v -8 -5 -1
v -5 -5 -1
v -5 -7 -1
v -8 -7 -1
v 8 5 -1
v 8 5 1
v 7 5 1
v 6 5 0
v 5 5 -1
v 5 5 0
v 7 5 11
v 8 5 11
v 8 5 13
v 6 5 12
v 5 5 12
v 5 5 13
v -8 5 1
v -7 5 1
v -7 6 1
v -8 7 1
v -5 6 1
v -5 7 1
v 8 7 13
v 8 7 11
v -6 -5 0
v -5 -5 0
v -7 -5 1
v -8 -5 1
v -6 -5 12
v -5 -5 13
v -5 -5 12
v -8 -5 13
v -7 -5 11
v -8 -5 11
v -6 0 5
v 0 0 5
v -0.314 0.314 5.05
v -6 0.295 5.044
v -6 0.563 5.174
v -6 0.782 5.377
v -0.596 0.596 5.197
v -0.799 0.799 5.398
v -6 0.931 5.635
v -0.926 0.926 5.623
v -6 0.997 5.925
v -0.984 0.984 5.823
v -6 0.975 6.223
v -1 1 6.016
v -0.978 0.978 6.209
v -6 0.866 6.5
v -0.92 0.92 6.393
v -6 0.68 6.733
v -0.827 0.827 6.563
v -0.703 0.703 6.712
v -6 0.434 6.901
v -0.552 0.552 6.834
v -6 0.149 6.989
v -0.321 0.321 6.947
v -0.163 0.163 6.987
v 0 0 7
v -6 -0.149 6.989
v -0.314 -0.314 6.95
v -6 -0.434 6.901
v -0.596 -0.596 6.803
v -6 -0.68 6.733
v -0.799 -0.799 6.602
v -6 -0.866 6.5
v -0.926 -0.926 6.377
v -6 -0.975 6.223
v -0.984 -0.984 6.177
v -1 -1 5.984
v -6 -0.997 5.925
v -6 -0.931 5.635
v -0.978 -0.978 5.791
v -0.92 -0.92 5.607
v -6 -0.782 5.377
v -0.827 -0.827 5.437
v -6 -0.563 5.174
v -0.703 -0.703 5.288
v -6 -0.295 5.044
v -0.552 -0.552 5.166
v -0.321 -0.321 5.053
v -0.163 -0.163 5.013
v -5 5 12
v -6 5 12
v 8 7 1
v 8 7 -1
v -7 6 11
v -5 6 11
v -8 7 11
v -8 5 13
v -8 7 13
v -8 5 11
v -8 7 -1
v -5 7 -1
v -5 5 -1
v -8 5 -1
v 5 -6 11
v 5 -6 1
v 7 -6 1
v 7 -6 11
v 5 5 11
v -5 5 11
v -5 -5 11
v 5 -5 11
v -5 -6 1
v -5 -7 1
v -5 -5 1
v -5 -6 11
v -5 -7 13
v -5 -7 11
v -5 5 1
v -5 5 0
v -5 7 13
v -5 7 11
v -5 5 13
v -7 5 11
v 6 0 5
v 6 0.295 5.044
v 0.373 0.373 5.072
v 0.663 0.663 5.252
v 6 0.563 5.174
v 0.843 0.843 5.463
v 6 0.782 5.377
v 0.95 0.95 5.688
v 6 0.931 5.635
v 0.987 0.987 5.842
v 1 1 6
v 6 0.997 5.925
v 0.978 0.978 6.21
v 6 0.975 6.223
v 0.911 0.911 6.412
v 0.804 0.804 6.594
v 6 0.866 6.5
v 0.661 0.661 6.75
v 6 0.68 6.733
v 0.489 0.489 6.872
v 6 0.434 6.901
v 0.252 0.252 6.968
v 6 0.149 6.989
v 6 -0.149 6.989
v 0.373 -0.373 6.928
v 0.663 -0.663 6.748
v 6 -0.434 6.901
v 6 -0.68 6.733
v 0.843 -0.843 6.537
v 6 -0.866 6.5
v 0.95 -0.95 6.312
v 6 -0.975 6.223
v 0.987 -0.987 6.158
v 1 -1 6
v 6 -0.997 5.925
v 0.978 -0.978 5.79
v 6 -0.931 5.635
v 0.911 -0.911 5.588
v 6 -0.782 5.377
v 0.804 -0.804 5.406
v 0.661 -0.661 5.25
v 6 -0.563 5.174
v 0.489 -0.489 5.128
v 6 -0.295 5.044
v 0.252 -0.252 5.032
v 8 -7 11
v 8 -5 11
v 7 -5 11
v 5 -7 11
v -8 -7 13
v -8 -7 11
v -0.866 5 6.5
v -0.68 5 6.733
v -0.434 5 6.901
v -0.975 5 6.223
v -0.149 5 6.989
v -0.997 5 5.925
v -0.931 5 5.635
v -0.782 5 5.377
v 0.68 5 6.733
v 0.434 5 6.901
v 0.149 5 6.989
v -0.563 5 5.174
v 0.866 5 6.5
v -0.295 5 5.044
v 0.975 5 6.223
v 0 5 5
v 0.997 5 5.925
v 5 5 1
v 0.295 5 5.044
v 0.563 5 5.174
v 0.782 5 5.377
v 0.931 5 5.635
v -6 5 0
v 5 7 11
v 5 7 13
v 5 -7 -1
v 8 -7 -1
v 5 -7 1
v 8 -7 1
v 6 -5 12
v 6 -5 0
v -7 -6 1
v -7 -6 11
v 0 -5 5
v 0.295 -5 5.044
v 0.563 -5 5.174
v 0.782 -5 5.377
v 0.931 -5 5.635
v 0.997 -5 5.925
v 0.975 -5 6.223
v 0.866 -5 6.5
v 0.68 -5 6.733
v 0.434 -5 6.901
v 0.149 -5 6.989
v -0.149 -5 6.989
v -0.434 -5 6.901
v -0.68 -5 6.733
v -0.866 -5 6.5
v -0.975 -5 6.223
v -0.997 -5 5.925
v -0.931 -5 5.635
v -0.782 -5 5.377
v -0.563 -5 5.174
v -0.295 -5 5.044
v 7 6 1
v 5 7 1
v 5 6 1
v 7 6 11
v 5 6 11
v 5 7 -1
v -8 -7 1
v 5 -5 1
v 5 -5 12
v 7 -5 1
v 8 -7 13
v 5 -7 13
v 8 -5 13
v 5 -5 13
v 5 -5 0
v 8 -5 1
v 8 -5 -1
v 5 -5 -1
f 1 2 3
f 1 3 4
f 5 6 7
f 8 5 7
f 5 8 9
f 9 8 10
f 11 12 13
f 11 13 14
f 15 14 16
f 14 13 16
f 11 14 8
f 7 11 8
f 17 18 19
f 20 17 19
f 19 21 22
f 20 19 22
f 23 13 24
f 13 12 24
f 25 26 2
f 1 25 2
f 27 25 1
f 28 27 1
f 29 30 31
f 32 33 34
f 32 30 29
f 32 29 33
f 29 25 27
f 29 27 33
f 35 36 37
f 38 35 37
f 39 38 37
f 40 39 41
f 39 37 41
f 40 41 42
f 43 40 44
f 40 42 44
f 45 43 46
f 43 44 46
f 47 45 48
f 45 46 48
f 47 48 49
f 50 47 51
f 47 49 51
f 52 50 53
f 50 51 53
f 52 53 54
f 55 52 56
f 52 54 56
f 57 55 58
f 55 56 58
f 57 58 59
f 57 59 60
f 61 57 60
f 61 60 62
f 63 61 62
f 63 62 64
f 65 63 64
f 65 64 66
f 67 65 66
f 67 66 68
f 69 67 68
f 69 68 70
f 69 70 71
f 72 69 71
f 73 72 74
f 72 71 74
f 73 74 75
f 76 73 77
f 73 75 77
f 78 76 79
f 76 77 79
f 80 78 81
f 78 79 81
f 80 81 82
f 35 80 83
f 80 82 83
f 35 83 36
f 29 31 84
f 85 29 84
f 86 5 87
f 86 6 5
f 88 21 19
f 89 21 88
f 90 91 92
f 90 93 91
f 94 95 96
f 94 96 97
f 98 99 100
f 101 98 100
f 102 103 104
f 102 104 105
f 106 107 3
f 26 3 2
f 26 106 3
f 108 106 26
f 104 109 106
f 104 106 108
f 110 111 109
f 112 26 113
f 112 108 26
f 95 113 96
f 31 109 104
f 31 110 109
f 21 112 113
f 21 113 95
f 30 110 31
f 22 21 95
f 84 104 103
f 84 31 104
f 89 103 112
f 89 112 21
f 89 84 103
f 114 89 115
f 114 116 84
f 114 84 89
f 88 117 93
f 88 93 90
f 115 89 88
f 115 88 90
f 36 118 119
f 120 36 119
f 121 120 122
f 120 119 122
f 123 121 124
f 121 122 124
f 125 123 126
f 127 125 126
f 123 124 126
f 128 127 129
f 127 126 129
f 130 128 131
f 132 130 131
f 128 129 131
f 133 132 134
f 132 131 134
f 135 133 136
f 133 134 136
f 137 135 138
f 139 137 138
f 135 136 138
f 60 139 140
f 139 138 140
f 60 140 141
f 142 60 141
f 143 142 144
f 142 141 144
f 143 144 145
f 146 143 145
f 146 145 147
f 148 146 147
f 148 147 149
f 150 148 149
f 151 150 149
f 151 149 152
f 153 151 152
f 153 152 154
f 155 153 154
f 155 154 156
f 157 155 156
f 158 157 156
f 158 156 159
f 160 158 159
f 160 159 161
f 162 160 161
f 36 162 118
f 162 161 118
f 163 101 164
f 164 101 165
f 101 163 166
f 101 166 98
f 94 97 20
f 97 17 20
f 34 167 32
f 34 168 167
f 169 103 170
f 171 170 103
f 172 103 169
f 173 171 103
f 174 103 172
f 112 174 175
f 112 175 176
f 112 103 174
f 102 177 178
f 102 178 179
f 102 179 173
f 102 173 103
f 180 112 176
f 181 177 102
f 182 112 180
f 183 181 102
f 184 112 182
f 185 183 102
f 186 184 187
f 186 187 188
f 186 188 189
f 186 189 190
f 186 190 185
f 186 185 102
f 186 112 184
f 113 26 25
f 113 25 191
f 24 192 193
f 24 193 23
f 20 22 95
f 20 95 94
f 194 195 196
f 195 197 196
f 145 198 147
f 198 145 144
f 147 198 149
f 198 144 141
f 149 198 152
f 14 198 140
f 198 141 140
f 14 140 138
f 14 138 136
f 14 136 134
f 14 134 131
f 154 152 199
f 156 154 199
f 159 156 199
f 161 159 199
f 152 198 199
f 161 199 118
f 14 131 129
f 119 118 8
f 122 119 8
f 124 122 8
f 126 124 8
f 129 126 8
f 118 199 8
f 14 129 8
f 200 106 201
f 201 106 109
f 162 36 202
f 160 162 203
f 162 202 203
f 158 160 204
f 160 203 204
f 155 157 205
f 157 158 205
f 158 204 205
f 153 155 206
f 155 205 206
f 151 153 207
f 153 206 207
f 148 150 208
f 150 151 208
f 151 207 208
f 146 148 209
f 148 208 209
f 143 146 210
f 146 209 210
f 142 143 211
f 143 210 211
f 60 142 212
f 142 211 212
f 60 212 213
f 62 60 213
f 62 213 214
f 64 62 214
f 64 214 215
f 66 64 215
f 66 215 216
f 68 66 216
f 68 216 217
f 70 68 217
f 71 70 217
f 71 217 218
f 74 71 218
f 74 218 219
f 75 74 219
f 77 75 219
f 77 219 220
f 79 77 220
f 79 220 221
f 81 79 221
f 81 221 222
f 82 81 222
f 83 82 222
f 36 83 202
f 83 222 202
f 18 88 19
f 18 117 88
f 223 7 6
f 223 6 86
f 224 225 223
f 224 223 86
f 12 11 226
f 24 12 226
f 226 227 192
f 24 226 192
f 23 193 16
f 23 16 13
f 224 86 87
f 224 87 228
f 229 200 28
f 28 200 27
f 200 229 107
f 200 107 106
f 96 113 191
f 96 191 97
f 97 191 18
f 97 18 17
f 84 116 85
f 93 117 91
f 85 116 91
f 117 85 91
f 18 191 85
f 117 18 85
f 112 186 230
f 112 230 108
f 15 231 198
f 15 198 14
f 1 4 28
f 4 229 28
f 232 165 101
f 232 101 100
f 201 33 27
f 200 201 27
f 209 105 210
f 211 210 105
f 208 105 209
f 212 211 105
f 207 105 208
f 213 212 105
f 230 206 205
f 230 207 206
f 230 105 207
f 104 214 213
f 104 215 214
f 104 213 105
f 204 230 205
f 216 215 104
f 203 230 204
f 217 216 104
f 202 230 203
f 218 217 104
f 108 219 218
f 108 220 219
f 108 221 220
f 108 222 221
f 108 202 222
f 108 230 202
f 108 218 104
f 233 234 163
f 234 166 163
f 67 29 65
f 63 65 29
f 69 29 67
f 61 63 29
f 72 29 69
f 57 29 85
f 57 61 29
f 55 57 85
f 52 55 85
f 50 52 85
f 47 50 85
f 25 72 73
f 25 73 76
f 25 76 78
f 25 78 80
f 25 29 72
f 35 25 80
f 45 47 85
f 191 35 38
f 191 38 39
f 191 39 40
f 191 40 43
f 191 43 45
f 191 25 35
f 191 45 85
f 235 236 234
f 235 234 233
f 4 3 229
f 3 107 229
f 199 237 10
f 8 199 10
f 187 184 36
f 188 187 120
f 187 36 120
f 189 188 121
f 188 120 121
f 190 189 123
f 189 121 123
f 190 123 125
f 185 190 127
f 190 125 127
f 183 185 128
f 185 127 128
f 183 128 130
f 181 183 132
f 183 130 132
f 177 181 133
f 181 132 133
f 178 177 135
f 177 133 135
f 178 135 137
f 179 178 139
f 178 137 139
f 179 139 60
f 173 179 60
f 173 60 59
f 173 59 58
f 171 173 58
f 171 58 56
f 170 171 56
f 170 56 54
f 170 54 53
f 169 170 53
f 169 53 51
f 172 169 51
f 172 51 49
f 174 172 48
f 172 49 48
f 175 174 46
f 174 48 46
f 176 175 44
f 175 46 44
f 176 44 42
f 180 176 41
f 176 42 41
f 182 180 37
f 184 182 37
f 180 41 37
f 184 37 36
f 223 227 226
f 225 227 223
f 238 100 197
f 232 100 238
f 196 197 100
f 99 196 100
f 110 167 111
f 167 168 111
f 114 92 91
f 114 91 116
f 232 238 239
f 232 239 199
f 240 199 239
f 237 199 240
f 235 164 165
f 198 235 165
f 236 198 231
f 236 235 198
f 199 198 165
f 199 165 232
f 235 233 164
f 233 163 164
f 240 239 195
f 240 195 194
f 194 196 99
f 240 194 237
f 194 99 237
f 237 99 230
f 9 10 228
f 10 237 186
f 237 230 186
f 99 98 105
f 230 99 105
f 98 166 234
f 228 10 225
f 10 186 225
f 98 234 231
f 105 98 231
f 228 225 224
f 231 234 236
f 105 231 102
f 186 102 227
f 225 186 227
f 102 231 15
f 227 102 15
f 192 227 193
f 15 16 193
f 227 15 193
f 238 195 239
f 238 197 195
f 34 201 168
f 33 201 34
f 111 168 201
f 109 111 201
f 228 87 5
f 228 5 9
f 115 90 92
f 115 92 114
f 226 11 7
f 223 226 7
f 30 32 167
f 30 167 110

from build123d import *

# Parameters (mm, degrees)
SKETCH1_W            = 12
SKETCH1_H            = 12
BOSS_EXTRUDE1_DEPTH  = 12
SKETCH2_W            = 10
SKETCH2_H            = 12
CUT_EXTRUDE1_DEPTH   = 1
SKETCH3_W            = 10
SKETCH3_H            = 11
CUT_EXTRUDE2_DEPTH   = 1
SKETCH4_W            = 10
SKETCH4_H            = 11
CUT_EXTRUDE3_DEPTH   = 1
SKETCH5_W            = 10
SKETCH5_H            = 10
CUT_EXTRUDE4_DEPTH   = 1
SKETCH6_W            = 12
SKETCH6_H            = 1
BOSS_EXTRUDE2_DEPTH  = 1
SKETCH7_W            = 12
SKETCH7_H            = 1
BOSS_EXTRUDE3_DEPTH  = 1
SKETCH8_W            = 12
SKETCH8_H            = 1
BOSS_EXTRUDE4_DEPTH  = 1
SKETCH12_W           = 2
SKETCH12_H           = 1
BOSS_EXTRUDE5_DEPTH  = 1
SKETCH13_W           = 2
SKETCH13_H           = 1
BOSS_EXTRUDE6_DEPTH  = 1
SKETCH14_W           = 2
SKETCH14_H           = 1
BOSS_EXTRUDE7_DEPTH  = 1
SKETCH16_W           = 2
SKETCH16_H           = 1
BOSS_EXTRUDE8_DEPTH  = 1
SKETCH19_W           = 2
SKETCH19_H           = 1
BOSS_EXTRUDE10_DEPTH = 1
SKETCH20_W           = 2
SKETCH20_H           = 1
BOSS_EXTRUDE11_DEPTH = 1
SKETCH21_W           = 2
SKETCH21_H           = 1
BOSS_EXTRUDE12_DEPTH = 1
SKETCH22_W           = 2
SKETCH22_H           = 1
BOSS_EXTRUDE13_DEPTH = 1
SKETCH23_W           = 1
SKETCH23_H           = 2
BOSS_EXTRUDE15_DEPTH = 1
SKETCH24_W           = 3
SKETCH24_H           = 2
BOSS_EXTRUDE16_DEPTH = 1
SKETCH25_W           = 1
SKETCH25_H           = 2
BOSS_EXTRUDE17_DEPTH = 1
SKETCH26_W           = 1
SKETCH26_H           = 2
BOSS_EXTRUDE19_DEPTH = 1
SKETCH28_W           = 1
SKETCH28_H           = 2
BOSS_EXTRUDE20_DEPTH = 1
SKETCH29_W           = 1
SKETCH29_H           = 2
BOSS_EXTRUDE21_DEPTH = 1
SKETCH30_W           = 1
SKETCH30_H           = 2
BOSS_EXTRUDE22_DEPTH = 1
SKETCH31_W           = 1
SKETCH31_H           = 2
BOSS_EXTRUDE24_DEPTH = 1
SKETCH33_W           = 1
SKETCH33_H           = 2
BOSS_EXTRUDE25_DEPTH = 1
SKETCH34_W           = 3
SKETCH34_H           = 2
BOSS_EXTRUDE26_DEPTH = 1
SKETCH35_W           = 3
SKETCH35_H           = 2
BOSS_EXTRUDE27_DEPTH = 1
SKETCH36_W           = 3
SKETCH36_H           = 2
BOSS_EXTRUDE28_DEPTH = 1
SKETCH37_W           = 3
SKETCH37_H           = 2
BOSS_EXTRUDE29_DEPTH = 1
SKETCH38_W           = 3
SKETCH38_H           = 2
BOSS_EXTRUDE30_DEPTH = 1
SKETCH39_W           = 3
SKETCH39_H           = 2
BOSS_EXTRUDE31_DEPTH = 1
SKETCH40_W           = 3
SKETCH40_H           = 2
BOSS_EXTRUDE32_DEPTH = 1
SKETCH41_R           = 1
CUT_EXTRUDE6_DEPTH   = 12
SKETCH42_R           = 1
CUT_EXTRUDE7_DEPTH   = 12


with BuildPart() as part:
    # Sketch1 → Boss-Extrude1 (new body)
    with BuildSketch(Plane.XY):
        Rectangle(SKETCH1_W, SKETCH1_H)
    extrude(amount=BOSS_EXTRUDE1_DEPTH)

    # Sketch2 → Cut-Extrude1 (cut)
    with BuildSketch(Plane.XY.offset(12)):
        Rectangle(SKETCH2_W, SKETCH2_H)
    extrude(amount=-CUT_EXTRUDE1_DEPTH, mode=Mode.SUBTRACT)

    # Sketch3 → Cut-Extrude2 (cut)
    with BuildSketch(Plane(origin=(0, -6, 0), x_dir=(-1, 0, 0), z_dir=(0, -1, 0))):
        with Locations((0, -5.5)):
            Rectangle(SKETCH3_W, SKETCH3_H)
    extrude(amount=-CUT_EXTRUDE2_DEPTH, mode=Mode.SUBTRACT)

    # Sketch4 → Cut-Extrude3 (cut)
    with BuildSketch(Plane(origin=(0, 0, 0), x_dir=(-1, 0, 0), z_dir=(0, 0, -1))):
        with Locations((0, 0.5)):
            Rectangle(SKETCH4_W, SKETCH4_H)
    extrude(amount=-CUT_EXTRUDE3_DEPTH, mode=Mode.SUBTRACT)

    # Sketch5 → Cut-Extrude4 (cut)
    with BuildSketch(Plane(origin=(0, 6, 0), x_dir=(1, 0, 0), z_dir=(0, 1, 0))):
        with Locations((0, -6)):
            Rectangle(SKETCH5_W, SKETCH5_H)
    extrude(amount=-CUT_EXTRUDE4_DEPTH, mode=Mode.SUBTRACT)

    # Sketch6 → Boss-Extrude2 (add)
    with BuildSketch(Plane.ZY.offset(6)):
        with Locations((6, -5.5)):
            Rectangle(SKETCH6_W, SKETCH6_H)
    extrude(amount=BOSS_EXTRUDE2_DEPTH)

    # Sketch7 → Boss-Extrude3 (add)
    with BuildSketch(Plane.ZY.offset(6)):
        with Locations((6, 5.5)):
            Rectangle(SKETCH7_W, SKETCH7_H)
    extrude(amount=BOSS_EXTRUDE3_DEPTH)

    # Sketch8 → Boss-Extrude4 (add)
    with BuildSketch(Plane(origin=(6, 0, 0), x_dir=(0, 0, -1), z_dir=(1, 0, 0))):
        with Locations((-6, 5.5)):
            Rectangle(SKETCH8_W, SKETCH8_H)
        with Locations((-6, -5.5)):
            Rectangle(SKETCH8_W, SKETCH8_H)
    extrude(amount=BOSS_EXTRUDE4_DEPTH)

    # Sketch12 → Boss-Extrude5 (add)
    with BuildSketch(Plane(origin=(0, -6, 0), x_dir=(-1, 0, 0), z_dir=(0, -1, 0))):
        with Locations((-6, -0.5)):
            Rectangle(SKETCH12_W, SKETCH12_H)
    extrude(amount=BOSS_EXTRUDE5_DEPTH)

    # Sketch13 → Boss-Extrude6 (add)
    with BuildSketch(Plane(origin=(0, -6, 0), x_dir=(-1, 0, 0), z_dir=(0, -1, 0))):
        with Locations((-6, -11.5)):
            Rectangle(SKETCH13_W, SKETCH13_H)
    extrude(amount=BOSS_EXTRUDE6_DEPTH)

    # Sketch14 → Boss-Extrude7 (add)
    with BuildSketch(Plane(origin=(0, -6, 0), x_dir=(-1, 0, 0), z_dir=(0, -1, 0))):
        with Locations((6, -0.5)):
            Rectangle(SKETCH14_W, SKETCH14_H)
    extrude(amount=BOSS_EXTRUDE7_DEPTH)

    # Sketch16 → Boss-Extrude8 (add)
    with BuildSketch(Plane(origin=(0, -6, 0), x_dir=(-1, 0, 0), z_dir=(0, -1, 0))):
        with Locations((6, -11.5)):
            Rectangle(SKETCH16_W, SKETCH16_H)
    extrude(amount=BOSS_EXTRUDE8_DEPTH)

    # Sketch19 → Boss-Extrude10 (add)
    with BuildSketch(Plane(origin=(0, 6, 0), x_dir=(1, 0, 0), z_dir=(0, 1, 0))):
        with Locations((6, -11.5)):
            Rectangle(SKETCH19_W, SKETCH19_H)
    extrude(amount=BOSS_EXTRUDE10_DEPTH)

    # Sketch20 → Boss-Extrude11 (add)
    with BuildSketch(Plane(origin=(0, 6, 0), x_dir=(1, 0, 0), z_dir=(0, 1, 0))):
        with Locations((-6, -11.5)):
            Rectangle(SKETCH20_W, SKETCH20_H)
    extrude(amount=BOSS_EXTRUDE11_DEPTH)

    # Sketch21 → Boss-Extrude12 (add)
    with BuildSketch(Plane(origin=(0, 6, 0), x_dir=(1, 0, 0), z_dir=(0, 1, 0))):
        with Locations((6, -0.5)):
            Rectangle(SKETCH21_W, SKETCH21_H)
    extrude(amount=BOSS_EXTRUDE12_DEPTH)

    # Sketch22 → Boss-Extrude13 (add)
    with BuildSketch(Plane(origin=(0, 6, 0), x_dir=(1, 0, 0), z_dir=(0, 1, 0))):
        with Locations((-6, -0.5)):
            Rectangle(SKETCH22_W, SKETCH22_H)
    extrude(amount=BOSS_EXTRUDE13_DEPTH)

    # Sketch23 → Boss-Extrude15 (add)
    with BuildSketch(Plane(origin=(7, 0, 0), x_dir=(0, 0, -1), z_dir=(1, 0, 0))):
        with Locations((-11.5, 6)):
            Rectangle(SKETCH23_W, SKETCH23_H)
    extrude(amount=BOSS_EXTRUDE15_DEPTH)

    # Sketch24 → Boss-Extrude16 (add)
    with BuildSketch(Plane.XY.offset(12)):
        with Locations((6.5, 6)):
            Rectangle(SKETCH24_W, SKETCH24_H)
    extrude(amount=BOSS_EXTRUDE16_DEPTH)

    # Sketch25 → Boss-Extrude17 (add)
    with BuildSketch(Plane(origin=(7, 0, 0), x_dir=(0, 0, -1), z_dir=(1, 0, 0))):
        with Locations((-11.5, -6)):
            Rectangle(SKETCH25_W, SKETCH25_H)
    extrude(amount=BOSS_EXTRUDE17_DEPTH)

    # Sketch26 → Boss-Extrude19 (add)
    with BuildSketch(Plane(origin=(7, 0, 0), x_dir=(0, 0, -1), z_dir=(1, 0, 0))):
        with Locations((-0.5, -6)):
            Rectangle(SKETCH26_W, SKETCH26_H)
    extrude(amount=BOSS_EXTRUDE19_DEPTH)

    # Sketch28 → Boss-Extrude20 (add)
    with BuildSketch(Plane(origin=(7, 0, 0), x_dir=(0, 0, -1), z_dir=(1, 0, 0))):
        with Locations((-0.5, 6)):
            Rectangle(SKETCH28_W, SKETCH28_H)
    extrude(amount=BOSS_EXTRUDE20_DEPTH)

    # Sketch29 → Boss-Extrude21 (add)
    with BuildSketch(Plane.ZY.offset(7)):
        with Locations((0.5, 6)):
            Rectangle(SKETCH29_W, SKETCH29_H)
    extrude(amount=BOSS_EXTRUDE21_DEPTH)

    # Sketch30 → Boss-Extrude22 (add)
    with BuildSketch(Plane.ZY.offset(7)):
        with Locations((11.5, 6)):
            Rectangle(SKETCH30_W, SKETCH30_H)
    extrude(amount=BOSS_EXTRUDE22_DEPTH)

    # Sketch31 → Boss-Extrude24 (add)
    with BuildSketch(Plane.ZY.offset(7)):
        with Locations((0.5, -6)):
            Rectangle(SKETCH31_W, SKETCH31_H)
    extrude(amount=BOSS_EXTRUDE24_DEPTH)

    # Sketch33 → Boss-Extrude25 (add)
    with BuildSketch(Plane.ZY.offset(7)):
        with Locations((11.5, -6)):
            Rectangle(SKETCH33_W, SKETCH33_H)
    extrude(amount=BOSS_EXTRUDE25_DEPTH)

    # Sketch34 → Boss-Extrude26 (add)
    with BuildSketch(Plane.XY.offset(12)):
        with Locations((-6.5, 6)):
            Rectangle(SKETCH34_W, SKETCH34_H)
    extrude(amount=BOSS_EXTRUDE26_DEPTH)

    # Sketch35 → Boss-Extrude27 (add)
    with BuildSketch(Plane.XY.offset(12)):
        with Locations((-6.5, -6)):
            Rectangle(SKETCH35_W, SKETCH35_H)
    extrude(amount=BOSS_EXTRUDE27_DEPTH)

    # Sketch36 → Boss-Extrude28 (add)
    with BuildSketch(Plane.XY.offset(12)):
        with Locations((6.5, -6)):
            Rectangle(SKETCH36_W, SKETCH36_H)
    extrude(amount=BOSS_EXTRUDE28_DEPTH)

    # Sketch37 → Boss-Extrude29 (add)
    with BuildSketch(Plane(origin=(0, 0, 0), x_dir=(-1, 0, 0), z_dir=(0, 0, -1))):
        with Locations((-6.5, 6)):
            Rectangle(SKETCH37_W, SKETCH37_H)
    extrude(amount=BOSS_EXTRUDE29_DEPTH)

    # Sketch38 → Boss-Extrude30 (add)
    with BuildSketch(Plane(origin=(0, 0, 0), x_dir=(-1, 0, 0), z_dir=(0, 0, -1))):
        with Locations((-6.5, -6)):
            Rectangle(SKETCH38_W, SKETCH38_H)
    extrude(amount=BOSS_EXTRUDE30_DEPTH)

    # Sketch39 → Boss-Extrude31 (add)
    with BuildSketch(Plane(origin=(0, 0, 0), x_dir=(-1, 0, 0), z_dir=(0, 0, -1))):
        with Locations((6.5, -6)):
            Rectangle(SKETCH39_W, SKETCH39_H)
    extrude(amount=BOSS_EXTRUDE31_DEPTH)

    # Sketch40 → Boss-Extrude32 (add)
    with BuildSketch(Plane(origin=(0, 0, 0), x_dir=(-1, 0, 0), z_dir=(0, 0, -1))):
        with Locations((6.5, 6)):
            Rectangle(SKETCH40_W, SKETCH40_H)
    extrude(amount=BOSS_EXTRUDE32_DEPTH)

    # Sketch41 → Cut-Extrude6 (cut)
    with BuildSketch(Plane(origin=(6, 0, 0), x_dir=(0, 0, -1), z_dir=(1, 0, 0))):
        with Locations((-6, 0)):
            Circle(SKETCH41_R)
    extrude(amount=-CUT_EXTRUDE6_DEPTH, mode=Mode.SUBTRACT)

    # Sketch42 → Cut-Extrude7 (cut)
    with BuildSketch(Plane(origin=(0, -5, 0), x_dir=(-1, 0, 0), z_dir=(0, -1, 0))):
        with Locations(Location((0, -6, 0), (0, 0, 90))):
            Circle(SKETCH42_R)
    extrude(amount=-CUT_EXTRUDE7_DEPTH, mode=Mode.SUBTRACT)


solid = part.part
